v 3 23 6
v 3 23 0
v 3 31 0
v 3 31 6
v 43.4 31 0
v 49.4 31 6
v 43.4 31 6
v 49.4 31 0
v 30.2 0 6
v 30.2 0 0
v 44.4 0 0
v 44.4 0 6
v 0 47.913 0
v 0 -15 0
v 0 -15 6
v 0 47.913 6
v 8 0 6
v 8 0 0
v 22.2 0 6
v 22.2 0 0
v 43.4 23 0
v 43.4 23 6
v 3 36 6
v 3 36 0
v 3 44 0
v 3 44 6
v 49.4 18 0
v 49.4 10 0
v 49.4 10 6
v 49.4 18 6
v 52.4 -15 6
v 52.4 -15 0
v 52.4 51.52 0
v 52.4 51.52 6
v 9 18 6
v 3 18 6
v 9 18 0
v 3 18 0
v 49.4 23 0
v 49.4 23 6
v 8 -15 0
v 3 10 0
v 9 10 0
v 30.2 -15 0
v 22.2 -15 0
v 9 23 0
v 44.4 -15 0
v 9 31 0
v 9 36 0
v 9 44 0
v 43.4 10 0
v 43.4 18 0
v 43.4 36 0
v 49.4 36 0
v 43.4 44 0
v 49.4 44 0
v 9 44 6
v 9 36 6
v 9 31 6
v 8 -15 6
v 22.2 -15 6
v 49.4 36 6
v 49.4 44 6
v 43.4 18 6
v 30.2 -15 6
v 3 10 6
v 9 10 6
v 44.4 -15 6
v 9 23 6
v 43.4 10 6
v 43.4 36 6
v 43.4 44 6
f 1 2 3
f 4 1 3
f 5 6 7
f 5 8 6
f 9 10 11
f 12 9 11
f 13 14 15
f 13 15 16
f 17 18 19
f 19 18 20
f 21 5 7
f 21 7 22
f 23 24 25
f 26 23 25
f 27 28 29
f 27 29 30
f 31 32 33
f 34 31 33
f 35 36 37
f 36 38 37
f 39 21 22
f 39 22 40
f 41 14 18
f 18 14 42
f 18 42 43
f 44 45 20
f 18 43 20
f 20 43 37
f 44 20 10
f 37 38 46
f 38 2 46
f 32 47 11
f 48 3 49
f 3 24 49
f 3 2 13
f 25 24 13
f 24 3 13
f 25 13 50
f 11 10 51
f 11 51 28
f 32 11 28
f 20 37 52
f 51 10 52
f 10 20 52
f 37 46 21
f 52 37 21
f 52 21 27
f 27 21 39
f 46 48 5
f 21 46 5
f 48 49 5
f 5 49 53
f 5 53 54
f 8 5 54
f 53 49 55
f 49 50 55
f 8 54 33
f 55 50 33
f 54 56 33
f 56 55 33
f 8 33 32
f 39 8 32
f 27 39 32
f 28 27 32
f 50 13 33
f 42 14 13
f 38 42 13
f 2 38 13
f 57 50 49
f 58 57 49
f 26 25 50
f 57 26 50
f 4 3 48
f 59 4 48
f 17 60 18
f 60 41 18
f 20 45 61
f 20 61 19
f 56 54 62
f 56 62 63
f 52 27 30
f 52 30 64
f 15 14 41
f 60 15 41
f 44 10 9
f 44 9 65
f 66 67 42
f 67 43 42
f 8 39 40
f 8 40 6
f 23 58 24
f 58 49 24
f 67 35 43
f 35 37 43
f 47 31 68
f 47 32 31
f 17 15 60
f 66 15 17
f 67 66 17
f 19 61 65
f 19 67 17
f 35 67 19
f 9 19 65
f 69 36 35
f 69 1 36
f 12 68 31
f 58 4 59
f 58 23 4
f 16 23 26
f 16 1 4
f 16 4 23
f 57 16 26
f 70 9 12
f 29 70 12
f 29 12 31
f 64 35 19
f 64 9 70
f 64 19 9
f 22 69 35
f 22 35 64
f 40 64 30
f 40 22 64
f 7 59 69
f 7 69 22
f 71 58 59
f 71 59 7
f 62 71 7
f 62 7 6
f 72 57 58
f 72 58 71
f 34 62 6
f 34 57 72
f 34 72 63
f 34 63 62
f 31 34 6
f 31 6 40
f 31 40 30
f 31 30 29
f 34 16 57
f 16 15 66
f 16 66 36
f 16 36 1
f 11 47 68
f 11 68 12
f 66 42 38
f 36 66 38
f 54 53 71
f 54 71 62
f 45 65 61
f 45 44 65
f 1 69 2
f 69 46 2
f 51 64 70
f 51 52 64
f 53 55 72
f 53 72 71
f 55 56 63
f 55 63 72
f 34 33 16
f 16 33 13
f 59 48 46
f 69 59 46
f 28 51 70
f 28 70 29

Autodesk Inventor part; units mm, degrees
ref_plane "YZ Plane" through (0, 0, 0) normal (1, 0, 0) x (0, 1, 0)
ref_plane "XZ Plane" through (0, 0, 0) normal (0, 1, 0) x (-1, 0, 0)
ref_plane "XY Plane" through (0, 0, 0) normal (0, 0, 1) x (1, 0, 0)
sketch "Sketch1" plane through (0, 0, 0) normal (0, 0, 1) x (1, 0, 0)
  line L0 (0, 0) -> (0, 47.913)
  line L1 (0, 0) -> (52.4, 0)
  line L2 (52.4, 0) -> (52.4, 51.52)
  line L3 (52.4, 51.52) -> (0, 47.913)
  line L4 (3, 44) -> (9, 44)
  line L5 (9, 44) -> (9, 36)
  line L6 (9, 36) -> (3, 36)
  line L7 (3, 36) -> (3, 44)
  line L8 (3, 31) -> (9, 31)
  line L9 (9, 31) -> (9, 23)
  line L10 (9, 23) -> (3, 23)
  line L11 (3, 23) -> (3, 31)
  line L12 (3, 18) -> (9, 18)
  line L13 (9, 18) -> (9, 10)
  line L14 (9, 10) -> (3, 10)
  line L15 (3, 10) -> (3, 18)
  line L16 (26.2, 0) -> (26.2, 49.7165) construction
  line L17 (49.4, 44) -> (43.4, 44)
  line L18 (43.4, 44) -> (43.4, 36)
  line L19 (43.4, 36) -> (49.4, 36)
  line L20 (49.4, 36) -> (49.4, 44)
  line L21 (49.4, 31) -> (43.4, 31)
  line L22 (43.4, 31) -> (43.4, 23)
  line L23 (43.4, 23) -> (49.4, 23)
  line L24 (49.4, 23) -> (49.4, 31)
  line L25 (49.4, 18) -> (43.4, 18)
  line L26 (43.4, 18) -> (43.4, 10)
  line L27 (43.4, 10) -> (49.4, 10)
  line L28 (49.4, 10) -> (49.4, 18)
  line L29 (0, 0) -> (0, -15)
  line L30 (0, -15) -> (8, -15)
  line L31 (8, -15) -> (8, 0)
  line L32 (52.4, 0) -> (52.4, -15)
  line L33 (52.4, -15) -> (44.4, -15)
  line L34 (44.4, -15) -> (44.4, 0)
  line L35 (22.2, 0) -> (30.2, 0)
  line L36 (30.2, 0) -> (30.2, -15)
  line L37 (30.2, -15) -> (22.2, -15)
  line L38 (22.2, -15) -> (22.2, 0)
  point P0 (3, 14)
  point P1 (3, 27)
  point P2 (3, 40)
  point P3 (6, 10)
  point P4 (6, 23)
  point P5 (6, 18)
  point P6 (6, 36)
  point P7 (6, 31)
  dimension "d0" = 47.913
  dimension "d1" = 52.4
  dimension "d2" = 51.52
  dimension "d3" = 6
  dimension "d4" = 8
  dimension "d5" = 6
  dimension "d6" = 8
  dimension "d7" = 6
  dimension "d8" = 8
  dimension "d9" = 3
  dimension "d10" = 3
  dimension "d11" = 3
  dimension "d12" = 10
  dimension "d13" = 5
  dimension "d14" = 5
  dimension "d17" = 15
  dimension "d18" = 8
  dimension "d19" = 8
  dimension "d20" = 15
  dimension "d21" = 8
  dimension "d22" = 15
  dimension "d24" = 14.2
extrude "Extrusion1" add sketch "Sketch1" along normal blind 6 contours L0 L3 L2 L1
extrude "Extrusion2" add sketch "Sketch1" along normal blind 6 contours L1 L31 L30 L29 | L1 L36 L37 L38 | L32 L33 L34 L1
properties part number "sort support V2 wall 1"
